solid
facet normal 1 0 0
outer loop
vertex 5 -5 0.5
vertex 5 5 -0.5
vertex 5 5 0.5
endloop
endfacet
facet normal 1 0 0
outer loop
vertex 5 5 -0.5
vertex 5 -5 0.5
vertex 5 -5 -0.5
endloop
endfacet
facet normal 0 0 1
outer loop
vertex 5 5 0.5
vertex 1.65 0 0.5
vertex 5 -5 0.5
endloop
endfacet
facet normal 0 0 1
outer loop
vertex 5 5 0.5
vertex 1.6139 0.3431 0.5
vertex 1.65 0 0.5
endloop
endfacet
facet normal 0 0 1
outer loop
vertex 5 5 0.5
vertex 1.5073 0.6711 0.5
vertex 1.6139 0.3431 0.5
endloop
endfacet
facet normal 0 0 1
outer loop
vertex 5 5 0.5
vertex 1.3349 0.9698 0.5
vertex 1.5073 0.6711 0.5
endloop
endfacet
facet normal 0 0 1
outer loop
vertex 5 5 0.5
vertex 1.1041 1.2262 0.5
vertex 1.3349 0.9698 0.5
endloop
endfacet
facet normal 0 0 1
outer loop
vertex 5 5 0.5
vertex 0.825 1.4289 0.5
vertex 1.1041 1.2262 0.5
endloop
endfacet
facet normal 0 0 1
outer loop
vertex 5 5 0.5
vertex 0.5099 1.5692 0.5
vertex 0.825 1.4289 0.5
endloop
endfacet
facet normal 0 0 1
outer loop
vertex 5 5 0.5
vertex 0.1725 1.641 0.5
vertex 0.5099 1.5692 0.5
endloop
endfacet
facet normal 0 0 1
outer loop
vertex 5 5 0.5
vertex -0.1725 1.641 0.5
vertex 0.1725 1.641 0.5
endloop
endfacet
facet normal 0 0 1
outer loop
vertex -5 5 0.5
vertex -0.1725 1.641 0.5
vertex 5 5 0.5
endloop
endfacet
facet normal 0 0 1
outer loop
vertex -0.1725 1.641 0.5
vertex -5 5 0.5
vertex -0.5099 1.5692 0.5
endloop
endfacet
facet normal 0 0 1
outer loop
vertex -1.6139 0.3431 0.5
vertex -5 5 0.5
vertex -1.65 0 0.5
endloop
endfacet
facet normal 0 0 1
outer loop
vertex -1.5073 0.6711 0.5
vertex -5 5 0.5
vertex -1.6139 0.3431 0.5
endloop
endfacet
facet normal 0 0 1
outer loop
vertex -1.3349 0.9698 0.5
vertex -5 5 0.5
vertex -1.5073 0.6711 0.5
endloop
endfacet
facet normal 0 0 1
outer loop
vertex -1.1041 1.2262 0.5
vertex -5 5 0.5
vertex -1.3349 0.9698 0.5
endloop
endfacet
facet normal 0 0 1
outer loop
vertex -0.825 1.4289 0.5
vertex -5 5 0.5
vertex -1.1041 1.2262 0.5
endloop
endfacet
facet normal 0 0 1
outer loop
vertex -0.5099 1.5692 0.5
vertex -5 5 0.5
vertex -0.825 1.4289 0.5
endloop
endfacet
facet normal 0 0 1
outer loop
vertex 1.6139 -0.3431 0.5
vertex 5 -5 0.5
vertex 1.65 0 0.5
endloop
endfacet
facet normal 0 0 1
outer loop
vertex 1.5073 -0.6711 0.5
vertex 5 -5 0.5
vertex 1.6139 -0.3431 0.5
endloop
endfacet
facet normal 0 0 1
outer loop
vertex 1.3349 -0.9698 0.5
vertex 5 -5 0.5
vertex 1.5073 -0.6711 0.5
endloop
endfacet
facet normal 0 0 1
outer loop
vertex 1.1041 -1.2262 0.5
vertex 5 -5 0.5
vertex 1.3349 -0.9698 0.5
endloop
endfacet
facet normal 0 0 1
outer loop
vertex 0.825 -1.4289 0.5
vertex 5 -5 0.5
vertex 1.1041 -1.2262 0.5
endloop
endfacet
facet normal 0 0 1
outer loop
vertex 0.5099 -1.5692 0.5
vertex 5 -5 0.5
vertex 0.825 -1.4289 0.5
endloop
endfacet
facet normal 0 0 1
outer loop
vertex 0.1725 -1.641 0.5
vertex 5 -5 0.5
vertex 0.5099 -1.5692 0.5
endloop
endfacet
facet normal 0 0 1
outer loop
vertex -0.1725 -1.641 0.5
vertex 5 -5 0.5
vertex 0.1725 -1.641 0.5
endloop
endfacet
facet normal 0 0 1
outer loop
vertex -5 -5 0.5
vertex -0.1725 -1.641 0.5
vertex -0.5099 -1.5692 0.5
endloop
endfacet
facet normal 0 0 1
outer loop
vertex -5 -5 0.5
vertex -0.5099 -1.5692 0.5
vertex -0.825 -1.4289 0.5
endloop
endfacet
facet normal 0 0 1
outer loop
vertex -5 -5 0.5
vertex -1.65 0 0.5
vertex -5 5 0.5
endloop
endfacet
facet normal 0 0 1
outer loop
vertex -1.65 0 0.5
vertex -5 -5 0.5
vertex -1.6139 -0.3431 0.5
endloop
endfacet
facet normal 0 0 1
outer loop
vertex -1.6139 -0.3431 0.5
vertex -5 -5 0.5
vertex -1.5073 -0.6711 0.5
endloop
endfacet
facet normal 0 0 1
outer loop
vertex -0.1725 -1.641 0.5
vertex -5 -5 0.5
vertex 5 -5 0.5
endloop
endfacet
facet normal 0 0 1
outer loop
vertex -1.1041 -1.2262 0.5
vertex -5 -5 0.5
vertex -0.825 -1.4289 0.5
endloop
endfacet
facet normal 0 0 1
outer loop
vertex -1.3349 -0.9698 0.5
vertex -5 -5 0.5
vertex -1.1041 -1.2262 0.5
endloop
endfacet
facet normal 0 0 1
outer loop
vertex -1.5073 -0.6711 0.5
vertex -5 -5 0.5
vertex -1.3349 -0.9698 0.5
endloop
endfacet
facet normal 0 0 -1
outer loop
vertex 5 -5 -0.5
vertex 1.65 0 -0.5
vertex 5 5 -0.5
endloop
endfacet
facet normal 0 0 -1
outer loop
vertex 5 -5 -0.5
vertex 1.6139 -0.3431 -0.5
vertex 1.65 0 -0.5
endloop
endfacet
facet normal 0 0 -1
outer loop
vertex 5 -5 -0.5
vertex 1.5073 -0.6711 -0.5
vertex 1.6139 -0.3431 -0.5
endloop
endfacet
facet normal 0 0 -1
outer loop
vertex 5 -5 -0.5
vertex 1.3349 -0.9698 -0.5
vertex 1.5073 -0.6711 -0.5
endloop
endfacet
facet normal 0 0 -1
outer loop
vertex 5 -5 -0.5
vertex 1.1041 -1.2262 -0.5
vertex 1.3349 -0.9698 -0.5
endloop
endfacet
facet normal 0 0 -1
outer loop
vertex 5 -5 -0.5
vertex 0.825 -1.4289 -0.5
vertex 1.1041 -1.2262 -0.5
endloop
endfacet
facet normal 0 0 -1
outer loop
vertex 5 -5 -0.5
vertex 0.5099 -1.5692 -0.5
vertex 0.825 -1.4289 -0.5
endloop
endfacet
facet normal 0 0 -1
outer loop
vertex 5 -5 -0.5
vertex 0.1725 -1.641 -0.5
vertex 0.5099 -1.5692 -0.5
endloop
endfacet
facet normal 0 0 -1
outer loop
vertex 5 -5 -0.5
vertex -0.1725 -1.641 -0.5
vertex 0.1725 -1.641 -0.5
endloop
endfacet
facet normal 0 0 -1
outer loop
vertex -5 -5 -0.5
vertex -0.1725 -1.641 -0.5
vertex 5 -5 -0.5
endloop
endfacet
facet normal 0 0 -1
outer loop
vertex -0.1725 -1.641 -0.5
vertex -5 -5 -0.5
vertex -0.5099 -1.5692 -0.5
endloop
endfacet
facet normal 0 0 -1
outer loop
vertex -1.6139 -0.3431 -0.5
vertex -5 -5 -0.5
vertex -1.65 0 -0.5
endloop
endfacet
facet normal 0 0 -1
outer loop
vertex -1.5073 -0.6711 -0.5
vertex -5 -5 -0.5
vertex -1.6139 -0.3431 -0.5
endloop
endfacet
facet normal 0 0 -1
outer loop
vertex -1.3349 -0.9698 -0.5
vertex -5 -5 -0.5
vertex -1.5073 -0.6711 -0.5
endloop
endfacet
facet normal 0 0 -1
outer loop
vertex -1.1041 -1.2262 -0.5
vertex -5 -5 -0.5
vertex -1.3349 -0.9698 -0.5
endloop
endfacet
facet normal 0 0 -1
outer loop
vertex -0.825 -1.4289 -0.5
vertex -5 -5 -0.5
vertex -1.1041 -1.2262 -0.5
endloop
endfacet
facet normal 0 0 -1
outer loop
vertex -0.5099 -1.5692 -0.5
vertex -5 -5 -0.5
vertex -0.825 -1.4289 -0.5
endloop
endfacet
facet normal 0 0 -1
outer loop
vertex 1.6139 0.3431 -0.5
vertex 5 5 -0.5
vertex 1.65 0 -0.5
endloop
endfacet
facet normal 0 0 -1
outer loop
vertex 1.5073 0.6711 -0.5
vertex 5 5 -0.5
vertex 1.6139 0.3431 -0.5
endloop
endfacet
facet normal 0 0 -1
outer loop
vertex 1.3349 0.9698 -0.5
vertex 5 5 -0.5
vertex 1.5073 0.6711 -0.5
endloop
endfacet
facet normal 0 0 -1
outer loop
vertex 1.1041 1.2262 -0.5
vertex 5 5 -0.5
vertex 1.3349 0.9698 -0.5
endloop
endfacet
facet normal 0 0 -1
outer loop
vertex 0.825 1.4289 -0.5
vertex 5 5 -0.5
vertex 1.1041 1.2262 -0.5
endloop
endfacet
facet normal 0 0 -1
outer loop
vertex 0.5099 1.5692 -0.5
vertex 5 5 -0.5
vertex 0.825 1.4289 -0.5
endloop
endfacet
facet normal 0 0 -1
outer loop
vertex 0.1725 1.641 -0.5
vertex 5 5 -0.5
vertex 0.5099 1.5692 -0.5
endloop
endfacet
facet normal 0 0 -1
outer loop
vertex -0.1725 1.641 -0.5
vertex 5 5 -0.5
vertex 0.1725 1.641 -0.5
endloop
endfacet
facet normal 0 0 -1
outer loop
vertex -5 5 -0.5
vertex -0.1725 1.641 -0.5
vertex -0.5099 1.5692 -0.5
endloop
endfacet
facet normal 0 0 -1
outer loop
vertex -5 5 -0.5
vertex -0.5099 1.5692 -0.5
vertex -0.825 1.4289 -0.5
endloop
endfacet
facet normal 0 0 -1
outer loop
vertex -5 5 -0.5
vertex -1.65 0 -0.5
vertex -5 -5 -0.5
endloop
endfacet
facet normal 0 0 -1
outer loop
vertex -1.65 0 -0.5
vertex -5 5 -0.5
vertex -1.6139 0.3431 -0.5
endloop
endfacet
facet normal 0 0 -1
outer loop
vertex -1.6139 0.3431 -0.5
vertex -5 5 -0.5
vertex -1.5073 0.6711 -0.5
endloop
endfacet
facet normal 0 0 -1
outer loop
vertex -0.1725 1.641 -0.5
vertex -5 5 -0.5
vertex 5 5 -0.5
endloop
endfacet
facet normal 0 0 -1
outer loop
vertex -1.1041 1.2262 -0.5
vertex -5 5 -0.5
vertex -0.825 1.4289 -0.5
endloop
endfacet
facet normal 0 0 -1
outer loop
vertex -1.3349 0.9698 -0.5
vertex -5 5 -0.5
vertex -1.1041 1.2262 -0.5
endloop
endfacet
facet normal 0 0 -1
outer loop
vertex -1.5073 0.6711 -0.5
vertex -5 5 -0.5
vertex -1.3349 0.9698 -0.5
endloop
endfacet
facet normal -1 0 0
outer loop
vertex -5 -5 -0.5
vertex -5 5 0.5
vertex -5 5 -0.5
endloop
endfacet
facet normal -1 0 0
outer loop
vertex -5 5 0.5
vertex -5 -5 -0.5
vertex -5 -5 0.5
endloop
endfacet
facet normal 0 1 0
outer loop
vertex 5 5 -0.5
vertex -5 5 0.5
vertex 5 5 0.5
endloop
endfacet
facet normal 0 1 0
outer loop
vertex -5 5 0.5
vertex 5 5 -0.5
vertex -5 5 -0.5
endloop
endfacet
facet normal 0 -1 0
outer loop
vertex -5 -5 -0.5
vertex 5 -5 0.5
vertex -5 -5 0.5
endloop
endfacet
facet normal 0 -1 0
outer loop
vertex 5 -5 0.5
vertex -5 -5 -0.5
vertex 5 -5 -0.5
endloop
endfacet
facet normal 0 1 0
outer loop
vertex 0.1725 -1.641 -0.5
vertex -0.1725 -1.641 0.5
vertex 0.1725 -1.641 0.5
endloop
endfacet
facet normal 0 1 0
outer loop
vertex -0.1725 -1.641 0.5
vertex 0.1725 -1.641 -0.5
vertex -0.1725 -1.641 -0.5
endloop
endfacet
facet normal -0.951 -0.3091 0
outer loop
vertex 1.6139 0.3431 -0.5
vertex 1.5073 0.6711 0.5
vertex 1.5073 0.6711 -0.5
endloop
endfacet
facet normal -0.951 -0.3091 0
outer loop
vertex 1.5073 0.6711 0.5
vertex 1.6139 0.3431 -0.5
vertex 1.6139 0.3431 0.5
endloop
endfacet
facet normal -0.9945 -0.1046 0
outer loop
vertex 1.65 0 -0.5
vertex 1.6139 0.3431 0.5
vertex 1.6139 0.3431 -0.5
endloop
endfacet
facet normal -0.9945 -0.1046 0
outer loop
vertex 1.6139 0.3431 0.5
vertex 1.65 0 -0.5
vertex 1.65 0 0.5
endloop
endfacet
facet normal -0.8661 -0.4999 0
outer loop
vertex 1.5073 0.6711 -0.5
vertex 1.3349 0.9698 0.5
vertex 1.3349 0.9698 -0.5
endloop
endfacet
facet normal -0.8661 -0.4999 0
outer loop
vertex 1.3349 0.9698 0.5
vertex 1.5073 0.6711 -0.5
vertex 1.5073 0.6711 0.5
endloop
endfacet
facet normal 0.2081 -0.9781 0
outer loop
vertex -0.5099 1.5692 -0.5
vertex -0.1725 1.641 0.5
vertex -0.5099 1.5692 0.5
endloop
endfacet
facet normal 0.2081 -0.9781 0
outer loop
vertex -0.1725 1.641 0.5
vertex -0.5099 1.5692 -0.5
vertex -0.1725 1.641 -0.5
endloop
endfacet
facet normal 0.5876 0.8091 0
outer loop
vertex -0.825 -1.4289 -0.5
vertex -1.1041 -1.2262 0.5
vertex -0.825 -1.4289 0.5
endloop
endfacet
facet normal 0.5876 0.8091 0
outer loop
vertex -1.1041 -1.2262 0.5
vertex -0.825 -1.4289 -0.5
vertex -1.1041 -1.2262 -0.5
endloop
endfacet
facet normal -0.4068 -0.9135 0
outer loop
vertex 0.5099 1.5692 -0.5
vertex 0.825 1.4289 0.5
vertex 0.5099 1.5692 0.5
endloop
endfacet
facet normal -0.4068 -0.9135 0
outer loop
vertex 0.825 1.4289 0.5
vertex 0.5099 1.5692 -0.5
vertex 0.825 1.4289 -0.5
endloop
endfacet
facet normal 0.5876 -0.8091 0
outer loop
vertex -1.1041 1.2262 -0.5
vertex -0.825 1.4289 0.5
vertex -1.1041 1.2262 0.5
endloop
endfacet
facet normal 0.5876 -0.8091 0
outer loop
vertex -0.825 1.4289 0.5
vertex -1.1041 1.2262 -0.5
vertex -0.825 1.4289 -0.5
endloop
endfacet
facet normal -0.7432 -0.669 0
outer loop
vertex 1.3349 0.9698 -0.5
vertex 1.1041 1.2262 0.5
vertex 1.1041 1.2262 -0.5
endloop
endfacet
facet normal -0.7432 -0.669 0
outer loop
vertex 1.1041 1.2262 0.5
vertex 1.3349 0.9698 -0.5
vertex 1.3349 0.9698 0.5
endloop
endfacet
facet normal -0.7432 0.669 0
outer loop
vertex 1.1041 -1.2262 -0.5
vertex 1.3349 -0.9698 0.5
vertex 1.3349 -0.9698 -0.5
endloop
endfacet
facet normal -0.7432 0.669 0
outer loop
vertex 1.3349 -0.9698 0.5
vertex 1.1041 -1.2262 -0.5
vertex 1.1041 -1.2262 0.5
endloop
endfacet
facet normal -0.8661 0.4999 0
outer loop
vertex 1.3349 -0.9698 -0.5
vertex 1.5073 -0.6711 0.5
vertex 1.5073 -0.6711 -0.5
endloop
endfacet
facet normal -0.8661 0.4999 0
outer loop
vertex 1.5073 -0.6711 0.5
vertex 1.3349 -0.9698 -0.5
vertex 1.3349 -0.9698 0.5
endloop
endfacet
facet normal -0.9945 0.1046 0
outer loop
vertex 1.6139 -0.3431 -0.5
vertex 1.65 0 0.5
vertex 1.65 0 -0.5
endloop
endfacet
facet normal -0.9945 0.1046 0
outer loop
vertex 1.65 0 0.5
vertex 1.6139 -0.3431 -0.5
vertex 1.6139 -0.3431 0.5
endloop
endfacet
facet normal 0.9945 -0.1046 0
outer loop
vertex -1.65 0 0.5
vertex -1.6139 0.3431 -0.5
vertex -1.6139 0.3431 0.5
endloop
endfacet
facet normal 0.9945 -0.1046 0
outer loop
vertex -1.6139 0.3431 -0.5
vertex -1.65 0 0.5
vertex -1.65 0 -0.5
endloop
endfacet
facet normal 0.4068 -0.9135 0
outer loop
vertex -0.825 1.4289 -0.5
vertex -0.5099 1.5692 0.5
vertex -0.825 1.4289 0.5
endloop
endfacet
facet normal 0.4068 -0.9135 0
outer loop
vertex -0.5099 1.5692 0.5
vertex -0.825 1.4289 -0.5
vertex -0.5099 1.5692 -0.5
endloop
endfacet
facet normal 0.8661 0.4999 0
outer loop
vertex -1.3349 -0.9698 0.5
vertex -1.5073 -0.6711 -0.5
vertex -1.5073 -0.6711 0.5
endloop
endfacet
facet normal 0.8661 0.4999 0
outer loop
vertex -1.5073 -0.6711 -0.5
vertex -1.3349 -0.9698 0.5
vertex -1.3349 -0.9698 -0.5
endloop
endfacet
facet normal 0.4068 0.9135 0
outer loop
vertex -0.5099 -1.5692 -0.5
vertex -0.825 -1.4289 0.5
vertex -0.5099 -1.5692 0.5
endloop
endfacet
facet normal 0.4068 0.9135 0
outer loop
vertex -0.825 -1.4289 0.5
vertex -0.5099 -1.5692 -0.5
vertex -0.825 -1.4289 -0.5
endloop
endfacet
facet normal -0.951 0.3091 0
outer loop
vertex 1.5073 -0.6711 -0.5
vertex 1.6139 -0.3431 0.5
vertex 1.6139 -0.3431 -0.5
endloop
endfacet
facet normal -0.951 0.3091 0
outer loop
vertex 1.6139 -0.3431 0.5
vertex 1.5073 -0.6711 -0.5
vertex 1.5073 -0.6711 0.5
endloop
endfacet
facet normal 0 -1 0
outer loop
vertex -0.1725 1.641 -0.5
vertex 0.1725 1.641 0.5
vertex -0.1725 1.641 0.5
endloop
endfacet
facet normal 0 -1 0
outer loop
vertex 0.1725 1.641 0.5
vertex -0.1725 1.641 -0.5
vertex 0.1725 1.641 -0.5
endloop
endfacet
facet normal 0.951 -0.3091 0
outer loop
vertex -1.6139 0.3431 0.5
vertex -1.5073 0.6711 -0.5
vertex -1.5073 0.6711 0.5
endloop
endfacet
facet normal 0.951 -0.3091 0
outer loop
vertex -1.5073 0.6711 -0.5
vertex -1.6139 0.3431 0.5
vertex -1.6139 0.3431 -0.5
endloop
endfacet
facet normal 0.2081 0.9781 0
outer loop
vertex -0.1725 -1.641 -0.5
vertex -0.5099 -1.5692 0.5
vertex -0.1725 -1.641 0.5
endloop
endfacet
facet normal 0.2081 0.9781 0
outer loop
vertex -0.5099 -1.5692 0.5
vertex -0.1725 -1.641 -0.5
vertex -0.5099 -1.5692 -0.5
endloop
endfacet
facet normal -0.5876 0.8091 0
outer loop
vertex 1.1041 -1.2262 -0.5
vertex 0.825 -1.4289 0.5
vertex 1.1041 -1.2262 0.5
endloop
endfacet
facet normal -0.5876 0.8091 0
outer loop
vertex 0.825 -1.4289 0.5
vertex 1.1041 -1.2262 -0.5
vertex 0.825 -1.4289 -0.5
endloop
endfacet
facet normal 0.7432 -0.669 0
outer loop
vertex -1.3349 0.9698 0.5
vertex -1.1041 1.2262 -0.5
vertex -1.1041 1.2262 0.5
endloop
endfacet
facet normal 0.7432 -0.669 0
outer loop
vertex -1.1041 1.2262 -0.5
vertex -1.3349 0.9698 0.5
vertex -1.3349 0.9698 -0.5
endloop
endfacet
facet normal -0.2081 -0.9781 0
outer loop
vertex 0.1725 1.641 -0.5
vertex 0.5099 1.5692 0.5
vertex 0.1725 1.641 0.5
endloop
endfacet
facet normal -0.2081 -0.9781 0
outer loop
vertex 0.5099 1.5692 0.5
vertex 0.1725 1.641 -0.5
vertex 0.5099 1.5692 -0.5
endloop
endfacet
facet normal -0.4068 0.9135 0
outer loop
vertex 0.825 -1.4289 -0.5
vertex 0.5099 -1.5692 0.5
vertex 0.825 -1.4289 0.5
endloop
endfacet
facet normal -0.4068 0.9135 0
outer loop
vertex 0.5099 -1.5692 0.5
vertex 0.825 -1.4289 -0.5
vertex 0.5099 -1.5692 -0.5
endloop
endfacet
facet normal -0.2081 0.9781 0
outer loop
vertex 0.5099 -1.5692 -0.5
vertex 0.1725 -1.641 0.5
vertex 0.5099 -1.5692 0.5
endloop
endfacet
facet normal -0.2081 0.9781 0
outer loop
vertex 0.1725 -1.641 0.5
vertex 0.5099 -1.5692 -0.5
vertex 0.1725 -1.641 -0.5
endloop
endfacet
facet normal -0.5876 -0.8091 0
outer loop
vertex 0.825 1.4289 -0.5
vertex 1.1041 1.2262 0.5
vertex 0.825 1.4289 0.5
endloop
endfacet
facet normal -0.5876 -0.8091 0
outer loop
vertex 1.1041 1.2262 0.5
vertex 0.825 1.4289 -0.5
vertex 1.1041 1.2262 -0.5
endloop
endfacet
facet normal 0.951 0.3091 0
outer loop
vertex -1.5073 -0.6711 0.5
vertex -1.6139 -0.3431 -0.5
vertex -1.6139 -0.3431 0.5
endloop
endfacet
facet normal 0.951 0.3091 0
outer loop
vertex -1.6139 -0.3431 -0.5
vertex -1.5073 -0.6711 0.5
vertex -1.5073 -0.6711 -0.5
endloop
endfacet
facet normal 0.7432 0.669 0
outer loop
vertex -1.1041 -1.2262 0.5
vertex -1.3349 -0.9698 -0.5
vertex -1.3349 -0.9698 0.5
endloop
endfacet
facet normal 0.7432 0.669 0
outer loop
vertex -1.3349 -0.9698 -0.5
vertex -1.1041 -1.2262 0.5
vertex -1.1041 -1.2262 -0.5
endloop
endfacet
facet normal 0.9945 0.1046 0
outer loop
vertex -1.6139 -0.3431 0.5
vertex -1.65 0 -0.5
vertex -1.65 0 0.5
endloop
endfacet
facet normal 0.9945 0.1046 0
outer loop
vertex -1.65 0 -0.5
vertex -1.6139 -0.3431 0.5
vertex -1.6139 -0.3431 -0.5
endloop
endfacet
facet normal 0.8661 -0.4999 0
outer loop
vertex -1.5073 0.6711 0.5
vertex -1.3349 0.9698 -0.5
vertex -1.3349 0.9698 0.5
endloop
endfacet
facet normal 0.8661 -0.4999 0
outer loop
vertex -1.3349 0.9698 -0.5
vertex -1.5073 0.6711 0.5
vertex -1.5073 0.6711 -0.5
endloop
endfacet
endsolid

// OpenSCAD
//
// Open Makers Cube Copyright 2019 
// Chris Wilson
// cmsjwilson@gmail.com
//
// This file is part of Open Makers Cube Project.
//
// Open Makers Cube is free software: you can redistribute it and/or modify it under the terms of the
// GNU General Public License as published by the Free Software Foundation, either version 3 of
// the License, or (at your option) any later version.
//
// Open Makers Cube is distributed in the hope that it will be useful, but WITHOUT ANY WARRANTY;
// without even the implied warranty of MERCHANTABILITY or FITNESS FOR A PARTICULAR PURPOSE.
// See the GNU General Public License for more details.
//
// You should have received a copy of the GNU General Public License along with Open Makers Cube.
// If not, see <https://www.gnu.org/licenses/>.
//


IN = 25.4;
MM = 1;
$fn = 30;

// TEVO Printer

/**
  Instructions:
  Print cube and measure.  Calculate x,y,circle dia coef and change
  constant values below and print again.
*/
XCOEF   = 1;
YCOEF   = .992;
ZCOEF   = 1;
DIACOEF = 1.1;

cube_dim = [200*MM * XCOEF, 1*IN * YCOEF, 1*MM * ZCOEF];

3mmCircle();

module 3mmCircle(){
difference(){

 cube([10,10, 1], center= true);
   cylinder(d=3*MM * DIACOEF, h=1*MM,center = true);
 }
}

module box1(){

difference(){

    cube(cube_dim);

    translate([20*MM, cube_dim[1]/2])
    cylinder(d=8*MM * DIACOEF);
}

}
